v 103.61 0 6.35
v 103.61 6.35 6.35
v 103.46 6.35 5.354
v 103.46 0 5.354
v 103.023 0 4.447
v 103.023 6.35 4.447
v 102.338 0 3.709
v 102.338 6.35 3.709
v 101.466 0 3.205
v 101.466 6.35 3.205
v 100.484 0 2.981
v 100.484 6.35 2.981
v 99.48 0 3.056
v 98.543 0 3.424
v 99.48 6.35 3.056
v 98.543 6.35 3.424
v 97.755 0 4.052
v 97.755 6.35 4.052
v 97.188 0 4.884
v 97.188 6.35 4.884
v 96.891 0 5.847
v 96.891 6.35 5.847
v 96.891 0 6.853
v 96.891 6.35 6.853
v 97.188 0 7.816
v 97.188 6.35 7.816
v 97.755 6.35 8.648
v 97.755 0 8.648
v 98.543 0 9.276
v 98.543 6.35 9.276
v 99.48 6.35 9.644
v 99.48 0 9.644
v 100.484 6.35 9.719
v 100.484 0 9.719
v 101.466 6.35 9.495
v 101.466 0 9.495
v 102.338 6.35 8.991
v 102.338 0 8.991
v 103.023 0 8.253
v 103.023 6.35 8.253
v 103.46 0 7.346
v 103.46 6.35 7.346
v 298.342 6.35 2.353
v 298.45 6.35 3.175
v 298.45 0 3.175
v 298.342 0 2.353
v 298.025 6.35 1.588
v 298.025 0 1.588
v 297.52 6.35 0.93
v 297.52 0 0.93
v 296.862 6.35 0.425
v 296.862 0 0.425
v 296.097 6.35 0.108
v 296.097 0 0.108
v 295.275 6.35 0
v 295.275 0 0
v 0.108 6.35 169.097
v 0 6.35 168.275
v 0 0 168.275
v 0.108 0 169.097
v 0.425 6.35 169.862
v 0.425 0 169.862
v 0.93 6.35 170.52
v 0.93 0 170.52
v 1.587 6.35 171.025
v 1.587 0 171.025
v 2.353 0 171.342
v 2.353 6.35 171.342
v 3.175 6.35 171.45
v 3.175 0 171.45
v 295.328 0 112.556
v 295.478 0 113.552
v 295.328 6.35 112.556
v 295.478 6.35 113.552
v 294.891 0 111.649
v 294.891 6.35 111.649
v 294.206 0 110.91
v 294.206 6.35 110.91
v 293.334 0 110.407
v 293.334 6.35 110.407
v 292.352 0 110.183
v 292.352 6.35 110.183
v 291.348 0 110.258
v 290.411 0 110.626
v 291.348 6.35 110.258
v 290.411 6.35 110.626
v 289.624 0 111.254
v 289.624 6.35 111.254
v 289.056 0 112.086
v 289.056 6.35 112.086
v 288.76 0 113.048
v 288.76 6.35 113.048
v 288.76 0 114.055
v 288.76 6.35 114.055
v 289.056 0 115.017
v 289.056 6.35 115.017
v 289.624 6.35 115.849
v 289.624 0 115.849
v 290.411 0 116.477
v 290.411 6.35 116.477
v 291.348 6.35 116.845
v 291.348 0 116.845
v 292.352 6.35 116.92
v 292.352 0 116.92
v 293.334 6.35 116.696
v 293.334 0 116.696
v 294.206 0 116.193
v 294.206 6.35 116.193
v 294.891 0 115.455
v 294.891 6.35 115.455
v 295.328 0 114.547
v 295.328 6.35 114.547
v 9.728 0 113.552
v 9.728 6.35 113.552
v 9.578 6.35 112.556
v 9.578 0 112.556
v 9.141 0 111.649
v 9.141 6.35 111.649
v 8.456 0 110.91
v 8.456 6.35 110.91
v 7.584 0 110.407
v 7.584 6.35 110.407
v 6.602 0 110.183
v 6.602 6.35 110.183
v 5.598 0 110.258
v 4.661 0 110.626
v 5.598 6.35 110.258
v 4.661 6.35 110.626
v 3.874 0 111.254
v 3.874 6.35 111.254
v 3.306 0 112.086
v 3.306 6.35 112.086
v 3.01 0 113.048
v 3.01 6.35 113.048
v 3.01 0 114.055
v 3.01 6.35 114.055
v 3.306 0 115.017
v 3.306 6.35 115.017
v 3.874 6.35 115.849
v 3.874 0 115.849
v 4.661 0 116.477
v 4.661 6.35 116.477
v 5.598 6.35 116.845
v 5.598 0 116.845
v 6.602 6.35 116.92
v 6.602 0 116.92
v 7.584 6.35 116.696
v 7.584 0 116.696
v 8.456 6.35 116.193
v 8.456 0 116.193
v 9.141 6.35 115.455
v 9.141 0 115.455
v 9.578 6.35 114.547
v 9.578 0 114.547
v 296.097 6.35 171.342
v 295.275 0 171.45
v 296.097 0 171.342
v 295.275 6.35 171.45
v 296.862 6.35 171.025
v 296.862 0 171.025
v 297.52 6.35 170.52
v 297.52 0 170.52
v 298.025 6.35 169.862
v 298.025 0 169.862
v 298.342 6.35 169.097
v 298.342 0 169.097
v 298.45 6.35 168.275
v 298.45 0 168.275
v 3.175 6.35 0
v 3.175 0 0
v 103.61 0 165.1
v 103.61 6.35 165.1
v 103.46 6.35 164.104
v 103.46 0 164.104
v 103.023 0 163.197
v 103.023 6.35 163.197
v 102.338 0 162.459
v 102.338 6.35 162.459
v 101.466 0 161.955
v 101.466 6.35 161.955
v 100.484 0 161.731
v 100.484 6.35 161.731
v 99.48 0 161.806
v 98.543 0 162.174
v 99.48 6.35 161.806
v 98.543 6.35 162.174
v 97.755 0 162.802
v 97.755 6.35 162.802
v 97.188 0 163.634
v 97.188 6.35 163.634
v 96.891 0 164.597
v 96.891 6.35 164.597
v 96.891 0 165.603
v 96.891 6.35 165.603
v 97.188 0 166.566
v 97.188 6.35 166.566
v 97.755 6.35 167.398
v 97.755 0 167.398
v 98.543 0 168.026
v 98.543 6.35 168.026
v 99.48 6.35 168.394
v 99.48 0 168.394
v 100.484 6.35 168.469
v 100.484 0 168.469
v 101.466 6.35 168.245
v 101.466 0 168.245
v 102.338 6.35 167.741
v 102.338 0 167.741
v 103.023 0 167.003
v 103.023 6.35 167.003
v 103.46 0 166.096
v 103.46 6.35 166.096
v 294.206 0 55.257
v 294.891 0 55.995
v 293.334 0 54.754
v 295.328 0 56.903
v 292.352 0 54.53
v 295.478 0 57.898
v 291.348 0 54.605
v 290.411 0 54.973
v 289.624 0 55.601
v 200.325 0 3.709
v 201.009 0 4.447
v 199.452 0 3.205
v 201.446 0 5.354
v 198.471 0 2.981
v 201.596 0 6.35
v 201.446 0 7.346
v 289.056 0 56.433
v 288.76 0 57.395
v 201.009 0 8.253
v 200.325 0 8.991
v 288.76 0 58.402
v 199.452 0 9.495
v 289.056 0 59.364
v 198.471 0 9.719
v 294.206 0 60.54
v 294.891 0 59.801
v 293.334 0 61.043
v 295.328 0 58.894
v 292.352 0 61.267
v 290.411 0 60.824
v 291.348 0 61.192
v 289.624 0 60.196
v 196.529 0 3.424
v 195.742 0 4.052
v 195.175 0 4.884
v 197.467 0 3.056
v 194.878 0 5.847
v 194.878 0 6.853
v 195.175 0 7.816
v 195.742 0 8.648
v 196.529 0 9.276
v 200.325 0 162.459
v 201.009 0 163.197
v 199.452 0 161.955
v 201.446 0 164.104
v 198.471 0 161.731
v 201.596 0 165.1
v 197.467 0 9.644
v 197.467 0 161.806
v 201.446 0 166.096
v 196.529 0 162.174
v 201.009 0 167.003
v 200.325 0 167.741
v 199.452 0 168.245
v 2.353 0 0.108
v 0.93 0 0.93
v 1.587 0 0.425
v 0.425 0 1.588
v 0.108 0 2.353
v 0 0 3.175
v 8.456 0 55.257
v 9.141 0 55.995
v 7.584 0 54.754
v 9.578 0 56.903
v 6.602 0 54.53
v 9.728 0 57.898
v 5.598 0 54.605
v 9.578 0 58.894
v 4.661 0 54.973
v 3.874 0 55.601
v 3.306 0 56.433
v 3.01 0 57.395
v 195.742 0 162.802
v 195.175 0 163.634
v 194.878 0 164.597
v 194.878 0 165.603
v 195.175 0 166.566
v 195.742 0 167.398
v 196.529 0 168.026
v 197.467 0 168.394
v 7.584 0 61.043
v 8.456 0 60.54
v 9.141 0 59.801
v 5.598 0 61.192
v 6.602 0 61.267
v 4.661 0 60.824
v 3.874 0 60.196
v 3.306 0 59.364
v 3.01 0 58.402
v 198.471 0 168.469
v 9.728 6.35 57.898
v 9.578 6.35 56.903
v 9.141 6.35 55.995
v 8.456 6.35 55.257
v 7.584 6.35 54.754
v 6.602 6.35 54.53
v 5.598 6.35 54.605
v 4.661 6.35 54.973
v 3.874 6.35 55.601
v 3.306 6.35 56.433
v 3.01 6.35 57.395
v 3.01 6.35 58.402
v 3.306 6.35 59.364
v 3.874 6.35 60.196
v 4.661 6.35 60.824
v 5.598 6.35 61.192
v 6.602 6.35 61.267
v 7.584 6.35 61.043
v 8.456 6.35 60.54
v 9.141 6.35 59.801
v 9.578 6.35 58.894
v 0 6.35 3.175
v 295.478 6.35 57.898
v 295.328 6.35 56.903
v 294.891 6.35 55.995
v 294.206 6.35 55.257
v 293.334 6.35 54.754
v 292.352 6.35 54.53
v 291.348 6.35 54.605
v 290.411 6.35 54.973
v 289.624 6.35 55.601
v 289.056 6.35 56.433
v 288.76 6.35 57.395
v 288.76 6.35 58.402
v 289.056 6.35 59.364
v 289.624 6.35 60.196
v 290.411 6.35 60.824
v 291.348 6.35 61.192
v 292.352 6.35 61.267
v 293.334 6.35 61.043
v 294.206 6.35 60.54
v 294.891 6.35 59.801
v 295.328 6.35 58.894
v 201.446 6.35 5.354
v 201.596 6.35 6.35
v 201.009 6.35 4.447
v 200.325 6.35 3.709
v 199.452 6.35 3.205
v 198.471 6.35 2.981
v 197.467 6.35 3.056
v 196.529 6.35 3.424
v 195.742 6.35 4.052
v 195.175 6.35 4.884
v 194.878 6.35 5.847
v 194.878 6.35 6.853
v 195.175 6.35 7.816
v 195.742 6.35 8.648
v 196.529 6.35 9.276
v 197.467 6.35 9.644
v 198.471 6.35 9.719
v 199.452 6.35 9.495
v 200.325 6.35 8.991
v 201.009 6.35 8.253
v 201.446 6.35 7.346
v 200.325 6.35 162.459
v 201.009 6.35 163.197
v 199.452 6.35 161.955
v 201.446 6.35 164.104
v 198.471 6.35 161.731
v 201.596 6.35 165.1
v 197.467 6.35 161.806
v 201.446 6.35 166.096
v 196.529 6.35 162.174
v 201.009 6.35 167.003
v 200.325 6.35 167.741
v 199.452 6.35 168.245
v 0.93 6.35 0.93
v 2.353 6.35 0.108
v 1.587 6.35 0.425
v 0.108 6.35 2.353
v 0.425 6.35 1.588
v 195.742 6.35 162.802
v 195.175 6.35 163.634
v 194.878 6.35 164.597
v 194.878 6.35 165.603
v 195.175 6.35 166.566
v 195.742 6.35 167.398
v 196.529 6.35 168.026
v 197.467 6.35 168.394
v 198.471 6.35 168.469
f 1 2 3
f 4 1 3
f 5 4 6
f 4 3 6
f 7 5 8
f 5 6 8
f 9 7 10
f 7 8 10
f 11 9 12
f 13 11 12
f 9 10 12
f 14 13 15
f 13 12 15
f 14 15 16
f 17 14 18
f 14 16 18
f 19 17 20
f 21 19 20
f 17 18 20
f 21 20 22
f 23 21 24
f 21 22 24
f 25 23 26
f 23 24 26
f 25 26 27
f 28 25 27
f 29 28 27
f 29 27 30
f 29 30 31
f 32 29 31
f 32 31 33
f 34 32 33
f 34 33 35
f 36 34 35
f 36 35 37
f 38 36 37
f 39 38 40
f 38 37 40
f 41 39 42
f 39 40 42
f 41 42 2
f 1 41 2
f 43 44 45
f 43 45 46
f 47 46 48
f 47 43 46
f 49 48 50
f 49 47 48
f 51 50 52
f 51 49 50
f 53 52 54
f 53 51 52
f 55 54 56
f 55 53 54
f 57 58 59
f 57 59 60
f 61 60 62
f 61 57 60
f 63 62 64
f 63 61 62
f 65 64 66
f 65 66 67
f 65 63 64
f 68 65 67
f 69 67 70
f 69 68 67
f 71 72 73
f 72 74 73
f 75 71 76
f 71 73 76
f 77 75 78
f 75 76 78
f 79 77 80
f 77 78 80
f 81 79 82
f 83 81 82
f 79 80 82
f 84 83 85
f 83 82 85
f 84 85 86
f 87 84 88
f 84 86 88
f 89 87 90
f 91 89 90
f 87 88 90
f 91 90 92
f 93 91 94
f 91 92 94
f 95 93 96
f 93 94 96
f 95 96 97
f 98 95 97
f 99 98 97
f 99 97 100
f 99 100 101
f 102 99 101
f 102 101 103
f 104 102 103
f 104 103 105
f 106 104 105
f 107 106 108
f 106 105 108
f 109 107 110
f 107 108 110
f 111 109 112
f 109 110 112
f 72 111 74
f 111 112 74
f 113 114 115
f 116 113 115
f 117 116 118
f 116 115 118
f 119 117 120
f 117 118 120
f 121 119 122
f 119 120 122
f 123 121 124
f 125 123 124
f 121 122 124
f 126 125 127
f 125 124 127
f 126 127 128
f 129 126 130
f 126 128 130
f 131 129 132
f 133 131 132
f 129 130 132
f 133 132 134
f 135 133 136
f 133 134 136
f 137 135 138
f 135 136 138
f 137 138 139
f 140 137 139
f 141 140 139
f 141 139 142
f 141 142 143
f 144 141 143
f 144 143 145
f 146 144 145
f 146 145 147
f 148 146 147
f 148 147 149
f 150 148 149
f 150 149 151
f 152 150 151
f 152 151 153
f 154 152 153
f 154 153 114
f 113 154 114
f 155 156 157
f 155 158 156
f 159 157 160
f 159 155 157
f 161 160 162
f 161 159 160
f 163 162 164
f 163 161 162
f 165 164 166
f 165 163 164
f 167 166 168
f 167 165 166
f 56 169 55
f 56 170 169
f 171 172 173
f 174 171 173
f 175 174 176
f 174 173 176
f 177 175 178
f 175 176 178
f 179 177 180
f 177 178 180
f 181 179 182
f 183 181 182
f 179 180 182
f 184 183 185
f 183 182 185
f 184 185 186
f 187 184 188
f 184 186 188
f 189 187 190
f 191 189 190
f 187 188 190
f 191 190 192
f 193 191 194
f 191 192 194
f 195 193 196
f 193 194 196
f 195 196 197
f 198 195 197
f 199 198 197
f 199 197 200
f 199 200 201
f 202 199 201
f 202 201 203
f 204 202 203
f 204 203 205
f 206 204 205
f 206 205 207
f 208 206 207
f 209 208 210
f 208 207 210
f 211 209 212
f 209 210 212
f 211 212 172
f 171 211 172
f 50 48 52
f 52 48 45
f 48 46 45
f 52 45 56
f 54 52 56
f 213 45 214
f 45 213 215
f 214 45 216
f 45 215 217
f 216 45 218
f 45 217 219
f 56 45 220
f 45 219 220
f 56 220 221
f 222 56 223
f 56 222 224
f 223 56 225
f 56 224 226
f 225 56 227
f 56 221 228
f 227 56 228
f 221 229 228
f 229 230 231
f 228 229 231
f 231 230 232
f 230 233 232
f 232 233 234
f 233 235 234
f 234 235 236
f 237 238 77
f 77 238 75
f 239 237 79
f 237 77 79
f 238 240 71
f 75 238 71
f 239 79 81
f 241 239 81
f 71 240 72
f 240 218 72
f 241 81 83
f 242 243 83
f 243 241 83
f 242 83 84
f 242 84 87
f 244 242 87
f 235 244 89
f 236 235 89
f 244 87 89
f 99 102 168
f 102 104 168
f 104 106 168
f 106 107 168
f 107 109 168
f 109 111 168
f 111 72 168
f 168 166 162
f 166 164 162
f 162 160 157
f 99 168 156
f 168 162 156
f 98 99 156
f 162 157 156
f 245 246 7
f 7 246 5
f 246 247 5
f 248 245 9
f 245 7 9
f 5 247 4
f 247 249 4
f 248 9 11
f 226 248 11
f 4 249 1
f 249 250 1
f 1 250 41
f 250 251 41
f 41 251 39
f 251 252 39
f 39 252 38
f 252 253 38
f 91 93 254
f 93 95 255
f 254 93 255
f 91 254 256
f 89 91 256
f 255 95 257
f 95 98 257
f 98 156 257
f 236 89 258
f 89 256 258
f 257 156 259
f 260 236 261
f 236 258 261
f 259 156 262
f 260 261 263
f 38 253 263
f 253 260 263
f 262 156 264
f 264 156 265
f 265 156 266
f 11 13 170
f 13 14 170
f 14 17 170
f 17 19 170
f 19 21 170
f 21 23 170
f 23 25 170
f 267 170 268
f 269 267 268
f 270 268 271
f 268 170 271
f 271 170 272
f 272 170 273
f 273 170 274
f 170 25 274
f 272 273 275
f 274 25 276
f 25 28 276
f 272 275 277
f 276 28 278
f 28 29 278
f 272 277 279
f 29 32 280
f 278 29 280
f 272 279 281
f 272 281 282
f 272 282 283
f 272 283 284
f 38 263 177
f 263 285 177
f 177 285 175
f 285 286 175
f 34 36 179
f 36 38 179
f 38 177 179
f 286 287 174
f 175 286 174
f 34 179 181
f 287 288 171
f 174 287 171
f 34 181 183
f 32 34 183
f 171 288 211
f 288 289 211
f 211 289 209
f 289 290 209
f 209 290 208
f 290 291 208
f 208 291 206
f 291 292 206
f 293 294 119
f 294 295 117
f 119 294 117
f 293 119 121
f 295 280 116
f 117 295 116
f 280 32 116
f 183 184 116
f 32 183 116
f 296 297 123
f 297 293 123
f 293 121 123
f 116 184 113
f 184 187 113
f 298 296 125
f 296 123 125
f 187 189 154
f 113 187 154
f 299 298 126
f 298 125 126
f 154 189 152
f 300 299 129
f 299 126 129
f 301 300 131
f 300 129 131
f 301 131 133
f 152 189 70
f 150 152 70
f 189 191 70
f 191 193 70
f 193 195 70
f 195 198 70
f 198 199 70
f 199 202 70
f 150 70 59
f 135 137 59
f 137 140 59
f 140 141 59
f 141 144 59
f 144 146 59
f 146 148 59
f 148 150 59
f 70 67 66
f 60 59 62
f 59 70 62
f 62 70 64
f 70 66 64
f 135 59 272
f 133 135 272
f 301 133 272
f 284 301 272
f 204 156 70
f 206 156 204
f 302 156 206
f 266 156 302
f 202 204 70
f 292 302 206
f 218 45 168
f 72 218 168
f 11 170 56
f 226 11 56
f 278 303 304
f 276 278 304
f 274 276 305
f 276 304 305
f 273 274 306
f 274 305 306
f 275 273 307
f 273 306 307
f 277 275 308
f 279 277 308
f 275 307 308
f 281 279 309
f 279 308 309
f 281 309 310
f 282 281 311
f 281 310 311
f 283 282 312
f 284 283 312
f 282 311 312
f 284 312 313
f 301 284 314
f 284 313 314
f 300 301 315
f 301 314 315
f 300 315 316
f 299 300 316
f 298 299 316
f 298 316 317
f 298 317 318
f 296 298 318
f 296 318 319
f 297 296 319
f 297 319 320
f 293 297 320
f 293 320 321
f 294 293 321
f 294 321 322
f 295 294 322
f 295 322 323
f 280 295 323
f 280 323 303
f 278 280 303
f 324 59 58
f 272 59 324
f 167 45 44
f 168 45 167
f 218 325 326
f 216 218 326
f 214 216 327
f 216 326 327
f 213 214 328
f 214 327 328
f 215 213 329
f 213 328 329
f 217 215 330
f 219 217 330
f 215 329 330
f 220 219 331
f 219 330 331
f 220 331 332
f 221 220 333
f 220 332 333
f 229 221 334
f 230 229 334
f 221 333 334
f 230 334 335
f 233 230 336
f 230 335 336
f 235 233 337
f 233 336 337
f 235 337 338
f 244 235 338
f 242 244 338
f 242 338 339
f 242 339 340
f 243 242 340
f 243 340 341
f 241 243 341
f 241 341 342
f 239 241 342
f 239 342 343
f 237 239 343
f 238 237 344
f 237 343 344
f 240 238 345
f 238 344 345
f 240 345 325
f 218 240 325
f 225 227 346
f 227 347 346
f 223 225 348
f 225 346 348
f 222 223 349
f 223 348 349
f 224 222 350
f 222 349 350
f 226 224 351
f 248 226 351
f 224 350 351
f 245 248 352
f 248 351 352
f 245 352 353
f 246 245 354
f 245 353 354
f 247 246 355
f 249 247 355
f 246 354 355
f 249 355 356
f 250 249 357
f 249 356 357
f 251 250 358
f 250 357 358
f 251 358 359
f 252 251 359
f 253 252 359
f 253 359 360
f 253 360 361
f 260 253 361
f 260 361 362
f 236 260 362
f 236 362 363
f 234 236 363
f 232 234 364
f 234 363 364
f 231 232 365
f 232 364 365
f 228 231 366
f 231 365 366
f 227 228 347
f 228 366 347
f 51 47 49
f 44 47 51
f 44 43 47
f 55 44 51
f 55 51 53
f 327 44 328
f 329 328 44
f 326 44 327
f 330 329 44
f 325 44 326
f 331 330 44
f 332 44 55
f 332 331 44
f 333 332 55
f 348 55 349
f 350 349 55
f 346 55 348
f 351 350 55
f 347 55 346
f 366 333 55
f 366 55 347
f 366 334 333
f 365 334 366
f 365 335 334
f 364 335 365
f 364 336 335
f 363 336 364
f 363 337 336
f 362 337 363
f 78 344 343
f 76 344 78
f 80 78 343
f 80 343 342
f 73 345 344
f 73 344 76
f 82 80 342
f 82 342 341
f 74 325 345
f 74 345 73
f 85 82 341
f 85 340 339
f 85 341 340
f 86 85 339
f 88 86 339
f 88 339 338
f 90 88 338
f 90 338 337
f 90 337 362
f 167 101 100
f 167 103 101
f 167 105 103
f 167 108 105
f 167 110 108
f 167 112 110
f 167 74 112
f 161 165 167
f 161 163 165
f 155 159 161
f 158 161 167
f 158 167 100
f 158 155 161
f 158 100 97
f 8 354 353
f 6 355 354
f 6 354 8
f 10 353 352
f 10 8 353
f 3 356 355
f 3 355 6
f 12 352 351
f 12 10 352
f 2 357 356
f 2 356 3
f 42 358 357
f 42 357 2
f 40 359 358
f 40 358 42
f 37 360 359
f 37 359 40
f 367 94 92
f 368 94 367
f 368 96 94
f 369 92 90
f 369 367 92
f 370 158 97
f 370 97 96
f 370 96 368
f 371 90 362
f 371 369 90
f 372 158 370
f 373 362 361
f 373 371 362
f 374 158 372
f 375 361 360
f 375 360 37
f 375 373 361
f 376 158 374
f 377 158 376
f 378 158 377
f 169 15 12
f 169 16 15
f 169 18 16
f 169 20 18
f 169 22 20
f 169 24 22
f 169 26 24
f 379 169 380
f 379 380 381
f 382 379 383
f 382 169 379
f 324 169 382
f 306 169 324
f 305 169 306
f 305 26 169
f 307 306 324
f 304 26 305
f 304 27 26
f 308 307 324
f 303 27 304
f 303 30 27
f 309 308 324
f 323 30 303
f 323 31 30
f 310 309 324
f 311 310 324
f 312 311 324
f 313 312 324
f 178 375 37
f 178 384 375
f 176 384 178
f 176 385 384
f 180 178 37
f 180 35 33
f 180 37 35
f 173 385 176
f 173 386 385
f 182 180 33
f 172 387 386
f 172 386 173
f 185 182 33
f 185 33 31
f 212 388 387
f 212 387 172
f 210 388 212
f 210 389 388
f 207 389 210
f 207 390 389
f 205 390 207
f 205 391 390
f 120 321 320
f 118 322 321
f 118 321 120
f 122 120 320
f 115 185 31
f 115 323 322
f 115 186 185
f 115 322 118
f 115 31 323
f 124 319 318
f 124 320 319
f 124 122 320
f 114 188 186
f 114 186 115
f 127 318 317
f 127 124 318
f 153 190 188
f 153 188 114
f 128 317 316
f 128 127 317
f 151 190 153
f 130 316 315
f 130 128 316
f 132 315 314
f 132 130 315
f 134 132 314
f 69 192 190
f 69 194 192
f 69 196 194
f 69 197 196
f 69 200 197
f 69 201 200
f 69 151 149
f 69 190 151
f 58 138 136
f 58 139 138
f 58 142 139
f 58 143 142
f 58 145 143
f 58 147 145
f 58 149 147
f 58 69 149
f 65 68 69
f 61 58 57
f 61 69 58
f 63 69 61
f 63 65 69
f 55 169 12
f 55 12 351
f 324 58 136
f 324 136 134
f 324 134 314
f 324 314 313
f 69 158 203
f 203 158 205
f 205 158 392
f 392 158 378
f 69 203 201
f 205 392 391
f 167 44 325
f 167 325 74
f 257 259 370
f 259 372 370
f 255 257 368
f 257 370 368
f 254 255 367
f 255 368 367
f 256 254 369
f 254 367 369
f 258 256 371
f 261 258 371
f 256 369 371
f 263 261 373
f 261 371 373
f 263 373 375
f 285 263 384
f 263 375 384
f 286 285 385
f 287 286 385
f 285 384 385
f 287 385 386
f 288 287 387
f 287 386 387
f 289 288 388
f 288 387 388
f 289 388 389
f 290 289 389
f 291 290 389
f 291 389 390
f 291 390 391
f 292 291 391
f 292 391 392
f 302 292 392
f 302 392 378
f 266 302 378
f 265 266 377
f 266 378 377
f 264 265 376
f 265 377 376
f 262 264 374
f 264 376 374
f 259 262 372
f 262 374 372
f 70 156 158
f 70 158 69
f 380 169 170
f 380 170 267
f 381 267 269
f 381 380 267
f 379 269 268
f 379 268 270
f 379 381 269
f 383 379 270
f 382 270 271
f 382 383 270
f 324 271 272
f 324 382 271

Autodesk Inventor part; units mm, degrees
ref_plane "YZ Plane" through (0, 0, 0) normal (1, 0, 0) x (0, 1, 0)
ref_plane "XZ Plane" through (0, 0, 0) normal (0, 1, 0) x (-1, 0, 0)
ref_plane "XY Plane" through (0, 0, 0) normal (0, 0, 1) x (1, 0, 0)
sketch "Sketch1" plane through (0, 0, 0) normal (0, 1, 0) x (-1, 0, 0)
  line L0 (0, 0) -> (-298.45, 0)
  line L1 (-298.45, 0) -> (-298.45, 171.45)
  line L2 (-298.45, 171.45) -> (0, 171.45)
  line L3 (0, 171.45) -> (0, 0)
  dimension "d0" = 298.45
  dimension "d1" = 171.45
extrude "Extrusion1" add sketch "Sketch1" along normal blind 6.35
sketch "Sketch3" plane through (0, 6.35, 0) normal (0, 1, 0) x (1, 0, 0)
  circle A0 centre (198.2183, -6.35) radius 3.3782 projected
  circle A1 centre (100.2317, -6.35) radius 3.3782 projected
  circle A2 centre (292.1, -57.8984) radius 3.3782 projected
  circle A3 centre (292.1, -113.5516) radius 3.3782 projected
  circle A4 centre (198.2183, -165.1) radius 3.3782 projected
  circle A5 centre (100.2317, -165.1) radius 3.3782 projected
  circle A6 centre (6.35, -57.8984) radius 3.3782 projected
  circle A7 centre (6.35, -113.5516) radius 3.3782 projected
  point P0 (0, 0)
extrude "Extrusion2" cut sketch "Sketch3" against normal up to next
fillet "Fillet1" radius 3.175 4 edges at (298.45, 3.175, 171.45) (0, 3.175, 171.45) (0, 3.175, 0) (298.45, 3.175, 0)
properties part number "Base" material "ABS Plastic"
